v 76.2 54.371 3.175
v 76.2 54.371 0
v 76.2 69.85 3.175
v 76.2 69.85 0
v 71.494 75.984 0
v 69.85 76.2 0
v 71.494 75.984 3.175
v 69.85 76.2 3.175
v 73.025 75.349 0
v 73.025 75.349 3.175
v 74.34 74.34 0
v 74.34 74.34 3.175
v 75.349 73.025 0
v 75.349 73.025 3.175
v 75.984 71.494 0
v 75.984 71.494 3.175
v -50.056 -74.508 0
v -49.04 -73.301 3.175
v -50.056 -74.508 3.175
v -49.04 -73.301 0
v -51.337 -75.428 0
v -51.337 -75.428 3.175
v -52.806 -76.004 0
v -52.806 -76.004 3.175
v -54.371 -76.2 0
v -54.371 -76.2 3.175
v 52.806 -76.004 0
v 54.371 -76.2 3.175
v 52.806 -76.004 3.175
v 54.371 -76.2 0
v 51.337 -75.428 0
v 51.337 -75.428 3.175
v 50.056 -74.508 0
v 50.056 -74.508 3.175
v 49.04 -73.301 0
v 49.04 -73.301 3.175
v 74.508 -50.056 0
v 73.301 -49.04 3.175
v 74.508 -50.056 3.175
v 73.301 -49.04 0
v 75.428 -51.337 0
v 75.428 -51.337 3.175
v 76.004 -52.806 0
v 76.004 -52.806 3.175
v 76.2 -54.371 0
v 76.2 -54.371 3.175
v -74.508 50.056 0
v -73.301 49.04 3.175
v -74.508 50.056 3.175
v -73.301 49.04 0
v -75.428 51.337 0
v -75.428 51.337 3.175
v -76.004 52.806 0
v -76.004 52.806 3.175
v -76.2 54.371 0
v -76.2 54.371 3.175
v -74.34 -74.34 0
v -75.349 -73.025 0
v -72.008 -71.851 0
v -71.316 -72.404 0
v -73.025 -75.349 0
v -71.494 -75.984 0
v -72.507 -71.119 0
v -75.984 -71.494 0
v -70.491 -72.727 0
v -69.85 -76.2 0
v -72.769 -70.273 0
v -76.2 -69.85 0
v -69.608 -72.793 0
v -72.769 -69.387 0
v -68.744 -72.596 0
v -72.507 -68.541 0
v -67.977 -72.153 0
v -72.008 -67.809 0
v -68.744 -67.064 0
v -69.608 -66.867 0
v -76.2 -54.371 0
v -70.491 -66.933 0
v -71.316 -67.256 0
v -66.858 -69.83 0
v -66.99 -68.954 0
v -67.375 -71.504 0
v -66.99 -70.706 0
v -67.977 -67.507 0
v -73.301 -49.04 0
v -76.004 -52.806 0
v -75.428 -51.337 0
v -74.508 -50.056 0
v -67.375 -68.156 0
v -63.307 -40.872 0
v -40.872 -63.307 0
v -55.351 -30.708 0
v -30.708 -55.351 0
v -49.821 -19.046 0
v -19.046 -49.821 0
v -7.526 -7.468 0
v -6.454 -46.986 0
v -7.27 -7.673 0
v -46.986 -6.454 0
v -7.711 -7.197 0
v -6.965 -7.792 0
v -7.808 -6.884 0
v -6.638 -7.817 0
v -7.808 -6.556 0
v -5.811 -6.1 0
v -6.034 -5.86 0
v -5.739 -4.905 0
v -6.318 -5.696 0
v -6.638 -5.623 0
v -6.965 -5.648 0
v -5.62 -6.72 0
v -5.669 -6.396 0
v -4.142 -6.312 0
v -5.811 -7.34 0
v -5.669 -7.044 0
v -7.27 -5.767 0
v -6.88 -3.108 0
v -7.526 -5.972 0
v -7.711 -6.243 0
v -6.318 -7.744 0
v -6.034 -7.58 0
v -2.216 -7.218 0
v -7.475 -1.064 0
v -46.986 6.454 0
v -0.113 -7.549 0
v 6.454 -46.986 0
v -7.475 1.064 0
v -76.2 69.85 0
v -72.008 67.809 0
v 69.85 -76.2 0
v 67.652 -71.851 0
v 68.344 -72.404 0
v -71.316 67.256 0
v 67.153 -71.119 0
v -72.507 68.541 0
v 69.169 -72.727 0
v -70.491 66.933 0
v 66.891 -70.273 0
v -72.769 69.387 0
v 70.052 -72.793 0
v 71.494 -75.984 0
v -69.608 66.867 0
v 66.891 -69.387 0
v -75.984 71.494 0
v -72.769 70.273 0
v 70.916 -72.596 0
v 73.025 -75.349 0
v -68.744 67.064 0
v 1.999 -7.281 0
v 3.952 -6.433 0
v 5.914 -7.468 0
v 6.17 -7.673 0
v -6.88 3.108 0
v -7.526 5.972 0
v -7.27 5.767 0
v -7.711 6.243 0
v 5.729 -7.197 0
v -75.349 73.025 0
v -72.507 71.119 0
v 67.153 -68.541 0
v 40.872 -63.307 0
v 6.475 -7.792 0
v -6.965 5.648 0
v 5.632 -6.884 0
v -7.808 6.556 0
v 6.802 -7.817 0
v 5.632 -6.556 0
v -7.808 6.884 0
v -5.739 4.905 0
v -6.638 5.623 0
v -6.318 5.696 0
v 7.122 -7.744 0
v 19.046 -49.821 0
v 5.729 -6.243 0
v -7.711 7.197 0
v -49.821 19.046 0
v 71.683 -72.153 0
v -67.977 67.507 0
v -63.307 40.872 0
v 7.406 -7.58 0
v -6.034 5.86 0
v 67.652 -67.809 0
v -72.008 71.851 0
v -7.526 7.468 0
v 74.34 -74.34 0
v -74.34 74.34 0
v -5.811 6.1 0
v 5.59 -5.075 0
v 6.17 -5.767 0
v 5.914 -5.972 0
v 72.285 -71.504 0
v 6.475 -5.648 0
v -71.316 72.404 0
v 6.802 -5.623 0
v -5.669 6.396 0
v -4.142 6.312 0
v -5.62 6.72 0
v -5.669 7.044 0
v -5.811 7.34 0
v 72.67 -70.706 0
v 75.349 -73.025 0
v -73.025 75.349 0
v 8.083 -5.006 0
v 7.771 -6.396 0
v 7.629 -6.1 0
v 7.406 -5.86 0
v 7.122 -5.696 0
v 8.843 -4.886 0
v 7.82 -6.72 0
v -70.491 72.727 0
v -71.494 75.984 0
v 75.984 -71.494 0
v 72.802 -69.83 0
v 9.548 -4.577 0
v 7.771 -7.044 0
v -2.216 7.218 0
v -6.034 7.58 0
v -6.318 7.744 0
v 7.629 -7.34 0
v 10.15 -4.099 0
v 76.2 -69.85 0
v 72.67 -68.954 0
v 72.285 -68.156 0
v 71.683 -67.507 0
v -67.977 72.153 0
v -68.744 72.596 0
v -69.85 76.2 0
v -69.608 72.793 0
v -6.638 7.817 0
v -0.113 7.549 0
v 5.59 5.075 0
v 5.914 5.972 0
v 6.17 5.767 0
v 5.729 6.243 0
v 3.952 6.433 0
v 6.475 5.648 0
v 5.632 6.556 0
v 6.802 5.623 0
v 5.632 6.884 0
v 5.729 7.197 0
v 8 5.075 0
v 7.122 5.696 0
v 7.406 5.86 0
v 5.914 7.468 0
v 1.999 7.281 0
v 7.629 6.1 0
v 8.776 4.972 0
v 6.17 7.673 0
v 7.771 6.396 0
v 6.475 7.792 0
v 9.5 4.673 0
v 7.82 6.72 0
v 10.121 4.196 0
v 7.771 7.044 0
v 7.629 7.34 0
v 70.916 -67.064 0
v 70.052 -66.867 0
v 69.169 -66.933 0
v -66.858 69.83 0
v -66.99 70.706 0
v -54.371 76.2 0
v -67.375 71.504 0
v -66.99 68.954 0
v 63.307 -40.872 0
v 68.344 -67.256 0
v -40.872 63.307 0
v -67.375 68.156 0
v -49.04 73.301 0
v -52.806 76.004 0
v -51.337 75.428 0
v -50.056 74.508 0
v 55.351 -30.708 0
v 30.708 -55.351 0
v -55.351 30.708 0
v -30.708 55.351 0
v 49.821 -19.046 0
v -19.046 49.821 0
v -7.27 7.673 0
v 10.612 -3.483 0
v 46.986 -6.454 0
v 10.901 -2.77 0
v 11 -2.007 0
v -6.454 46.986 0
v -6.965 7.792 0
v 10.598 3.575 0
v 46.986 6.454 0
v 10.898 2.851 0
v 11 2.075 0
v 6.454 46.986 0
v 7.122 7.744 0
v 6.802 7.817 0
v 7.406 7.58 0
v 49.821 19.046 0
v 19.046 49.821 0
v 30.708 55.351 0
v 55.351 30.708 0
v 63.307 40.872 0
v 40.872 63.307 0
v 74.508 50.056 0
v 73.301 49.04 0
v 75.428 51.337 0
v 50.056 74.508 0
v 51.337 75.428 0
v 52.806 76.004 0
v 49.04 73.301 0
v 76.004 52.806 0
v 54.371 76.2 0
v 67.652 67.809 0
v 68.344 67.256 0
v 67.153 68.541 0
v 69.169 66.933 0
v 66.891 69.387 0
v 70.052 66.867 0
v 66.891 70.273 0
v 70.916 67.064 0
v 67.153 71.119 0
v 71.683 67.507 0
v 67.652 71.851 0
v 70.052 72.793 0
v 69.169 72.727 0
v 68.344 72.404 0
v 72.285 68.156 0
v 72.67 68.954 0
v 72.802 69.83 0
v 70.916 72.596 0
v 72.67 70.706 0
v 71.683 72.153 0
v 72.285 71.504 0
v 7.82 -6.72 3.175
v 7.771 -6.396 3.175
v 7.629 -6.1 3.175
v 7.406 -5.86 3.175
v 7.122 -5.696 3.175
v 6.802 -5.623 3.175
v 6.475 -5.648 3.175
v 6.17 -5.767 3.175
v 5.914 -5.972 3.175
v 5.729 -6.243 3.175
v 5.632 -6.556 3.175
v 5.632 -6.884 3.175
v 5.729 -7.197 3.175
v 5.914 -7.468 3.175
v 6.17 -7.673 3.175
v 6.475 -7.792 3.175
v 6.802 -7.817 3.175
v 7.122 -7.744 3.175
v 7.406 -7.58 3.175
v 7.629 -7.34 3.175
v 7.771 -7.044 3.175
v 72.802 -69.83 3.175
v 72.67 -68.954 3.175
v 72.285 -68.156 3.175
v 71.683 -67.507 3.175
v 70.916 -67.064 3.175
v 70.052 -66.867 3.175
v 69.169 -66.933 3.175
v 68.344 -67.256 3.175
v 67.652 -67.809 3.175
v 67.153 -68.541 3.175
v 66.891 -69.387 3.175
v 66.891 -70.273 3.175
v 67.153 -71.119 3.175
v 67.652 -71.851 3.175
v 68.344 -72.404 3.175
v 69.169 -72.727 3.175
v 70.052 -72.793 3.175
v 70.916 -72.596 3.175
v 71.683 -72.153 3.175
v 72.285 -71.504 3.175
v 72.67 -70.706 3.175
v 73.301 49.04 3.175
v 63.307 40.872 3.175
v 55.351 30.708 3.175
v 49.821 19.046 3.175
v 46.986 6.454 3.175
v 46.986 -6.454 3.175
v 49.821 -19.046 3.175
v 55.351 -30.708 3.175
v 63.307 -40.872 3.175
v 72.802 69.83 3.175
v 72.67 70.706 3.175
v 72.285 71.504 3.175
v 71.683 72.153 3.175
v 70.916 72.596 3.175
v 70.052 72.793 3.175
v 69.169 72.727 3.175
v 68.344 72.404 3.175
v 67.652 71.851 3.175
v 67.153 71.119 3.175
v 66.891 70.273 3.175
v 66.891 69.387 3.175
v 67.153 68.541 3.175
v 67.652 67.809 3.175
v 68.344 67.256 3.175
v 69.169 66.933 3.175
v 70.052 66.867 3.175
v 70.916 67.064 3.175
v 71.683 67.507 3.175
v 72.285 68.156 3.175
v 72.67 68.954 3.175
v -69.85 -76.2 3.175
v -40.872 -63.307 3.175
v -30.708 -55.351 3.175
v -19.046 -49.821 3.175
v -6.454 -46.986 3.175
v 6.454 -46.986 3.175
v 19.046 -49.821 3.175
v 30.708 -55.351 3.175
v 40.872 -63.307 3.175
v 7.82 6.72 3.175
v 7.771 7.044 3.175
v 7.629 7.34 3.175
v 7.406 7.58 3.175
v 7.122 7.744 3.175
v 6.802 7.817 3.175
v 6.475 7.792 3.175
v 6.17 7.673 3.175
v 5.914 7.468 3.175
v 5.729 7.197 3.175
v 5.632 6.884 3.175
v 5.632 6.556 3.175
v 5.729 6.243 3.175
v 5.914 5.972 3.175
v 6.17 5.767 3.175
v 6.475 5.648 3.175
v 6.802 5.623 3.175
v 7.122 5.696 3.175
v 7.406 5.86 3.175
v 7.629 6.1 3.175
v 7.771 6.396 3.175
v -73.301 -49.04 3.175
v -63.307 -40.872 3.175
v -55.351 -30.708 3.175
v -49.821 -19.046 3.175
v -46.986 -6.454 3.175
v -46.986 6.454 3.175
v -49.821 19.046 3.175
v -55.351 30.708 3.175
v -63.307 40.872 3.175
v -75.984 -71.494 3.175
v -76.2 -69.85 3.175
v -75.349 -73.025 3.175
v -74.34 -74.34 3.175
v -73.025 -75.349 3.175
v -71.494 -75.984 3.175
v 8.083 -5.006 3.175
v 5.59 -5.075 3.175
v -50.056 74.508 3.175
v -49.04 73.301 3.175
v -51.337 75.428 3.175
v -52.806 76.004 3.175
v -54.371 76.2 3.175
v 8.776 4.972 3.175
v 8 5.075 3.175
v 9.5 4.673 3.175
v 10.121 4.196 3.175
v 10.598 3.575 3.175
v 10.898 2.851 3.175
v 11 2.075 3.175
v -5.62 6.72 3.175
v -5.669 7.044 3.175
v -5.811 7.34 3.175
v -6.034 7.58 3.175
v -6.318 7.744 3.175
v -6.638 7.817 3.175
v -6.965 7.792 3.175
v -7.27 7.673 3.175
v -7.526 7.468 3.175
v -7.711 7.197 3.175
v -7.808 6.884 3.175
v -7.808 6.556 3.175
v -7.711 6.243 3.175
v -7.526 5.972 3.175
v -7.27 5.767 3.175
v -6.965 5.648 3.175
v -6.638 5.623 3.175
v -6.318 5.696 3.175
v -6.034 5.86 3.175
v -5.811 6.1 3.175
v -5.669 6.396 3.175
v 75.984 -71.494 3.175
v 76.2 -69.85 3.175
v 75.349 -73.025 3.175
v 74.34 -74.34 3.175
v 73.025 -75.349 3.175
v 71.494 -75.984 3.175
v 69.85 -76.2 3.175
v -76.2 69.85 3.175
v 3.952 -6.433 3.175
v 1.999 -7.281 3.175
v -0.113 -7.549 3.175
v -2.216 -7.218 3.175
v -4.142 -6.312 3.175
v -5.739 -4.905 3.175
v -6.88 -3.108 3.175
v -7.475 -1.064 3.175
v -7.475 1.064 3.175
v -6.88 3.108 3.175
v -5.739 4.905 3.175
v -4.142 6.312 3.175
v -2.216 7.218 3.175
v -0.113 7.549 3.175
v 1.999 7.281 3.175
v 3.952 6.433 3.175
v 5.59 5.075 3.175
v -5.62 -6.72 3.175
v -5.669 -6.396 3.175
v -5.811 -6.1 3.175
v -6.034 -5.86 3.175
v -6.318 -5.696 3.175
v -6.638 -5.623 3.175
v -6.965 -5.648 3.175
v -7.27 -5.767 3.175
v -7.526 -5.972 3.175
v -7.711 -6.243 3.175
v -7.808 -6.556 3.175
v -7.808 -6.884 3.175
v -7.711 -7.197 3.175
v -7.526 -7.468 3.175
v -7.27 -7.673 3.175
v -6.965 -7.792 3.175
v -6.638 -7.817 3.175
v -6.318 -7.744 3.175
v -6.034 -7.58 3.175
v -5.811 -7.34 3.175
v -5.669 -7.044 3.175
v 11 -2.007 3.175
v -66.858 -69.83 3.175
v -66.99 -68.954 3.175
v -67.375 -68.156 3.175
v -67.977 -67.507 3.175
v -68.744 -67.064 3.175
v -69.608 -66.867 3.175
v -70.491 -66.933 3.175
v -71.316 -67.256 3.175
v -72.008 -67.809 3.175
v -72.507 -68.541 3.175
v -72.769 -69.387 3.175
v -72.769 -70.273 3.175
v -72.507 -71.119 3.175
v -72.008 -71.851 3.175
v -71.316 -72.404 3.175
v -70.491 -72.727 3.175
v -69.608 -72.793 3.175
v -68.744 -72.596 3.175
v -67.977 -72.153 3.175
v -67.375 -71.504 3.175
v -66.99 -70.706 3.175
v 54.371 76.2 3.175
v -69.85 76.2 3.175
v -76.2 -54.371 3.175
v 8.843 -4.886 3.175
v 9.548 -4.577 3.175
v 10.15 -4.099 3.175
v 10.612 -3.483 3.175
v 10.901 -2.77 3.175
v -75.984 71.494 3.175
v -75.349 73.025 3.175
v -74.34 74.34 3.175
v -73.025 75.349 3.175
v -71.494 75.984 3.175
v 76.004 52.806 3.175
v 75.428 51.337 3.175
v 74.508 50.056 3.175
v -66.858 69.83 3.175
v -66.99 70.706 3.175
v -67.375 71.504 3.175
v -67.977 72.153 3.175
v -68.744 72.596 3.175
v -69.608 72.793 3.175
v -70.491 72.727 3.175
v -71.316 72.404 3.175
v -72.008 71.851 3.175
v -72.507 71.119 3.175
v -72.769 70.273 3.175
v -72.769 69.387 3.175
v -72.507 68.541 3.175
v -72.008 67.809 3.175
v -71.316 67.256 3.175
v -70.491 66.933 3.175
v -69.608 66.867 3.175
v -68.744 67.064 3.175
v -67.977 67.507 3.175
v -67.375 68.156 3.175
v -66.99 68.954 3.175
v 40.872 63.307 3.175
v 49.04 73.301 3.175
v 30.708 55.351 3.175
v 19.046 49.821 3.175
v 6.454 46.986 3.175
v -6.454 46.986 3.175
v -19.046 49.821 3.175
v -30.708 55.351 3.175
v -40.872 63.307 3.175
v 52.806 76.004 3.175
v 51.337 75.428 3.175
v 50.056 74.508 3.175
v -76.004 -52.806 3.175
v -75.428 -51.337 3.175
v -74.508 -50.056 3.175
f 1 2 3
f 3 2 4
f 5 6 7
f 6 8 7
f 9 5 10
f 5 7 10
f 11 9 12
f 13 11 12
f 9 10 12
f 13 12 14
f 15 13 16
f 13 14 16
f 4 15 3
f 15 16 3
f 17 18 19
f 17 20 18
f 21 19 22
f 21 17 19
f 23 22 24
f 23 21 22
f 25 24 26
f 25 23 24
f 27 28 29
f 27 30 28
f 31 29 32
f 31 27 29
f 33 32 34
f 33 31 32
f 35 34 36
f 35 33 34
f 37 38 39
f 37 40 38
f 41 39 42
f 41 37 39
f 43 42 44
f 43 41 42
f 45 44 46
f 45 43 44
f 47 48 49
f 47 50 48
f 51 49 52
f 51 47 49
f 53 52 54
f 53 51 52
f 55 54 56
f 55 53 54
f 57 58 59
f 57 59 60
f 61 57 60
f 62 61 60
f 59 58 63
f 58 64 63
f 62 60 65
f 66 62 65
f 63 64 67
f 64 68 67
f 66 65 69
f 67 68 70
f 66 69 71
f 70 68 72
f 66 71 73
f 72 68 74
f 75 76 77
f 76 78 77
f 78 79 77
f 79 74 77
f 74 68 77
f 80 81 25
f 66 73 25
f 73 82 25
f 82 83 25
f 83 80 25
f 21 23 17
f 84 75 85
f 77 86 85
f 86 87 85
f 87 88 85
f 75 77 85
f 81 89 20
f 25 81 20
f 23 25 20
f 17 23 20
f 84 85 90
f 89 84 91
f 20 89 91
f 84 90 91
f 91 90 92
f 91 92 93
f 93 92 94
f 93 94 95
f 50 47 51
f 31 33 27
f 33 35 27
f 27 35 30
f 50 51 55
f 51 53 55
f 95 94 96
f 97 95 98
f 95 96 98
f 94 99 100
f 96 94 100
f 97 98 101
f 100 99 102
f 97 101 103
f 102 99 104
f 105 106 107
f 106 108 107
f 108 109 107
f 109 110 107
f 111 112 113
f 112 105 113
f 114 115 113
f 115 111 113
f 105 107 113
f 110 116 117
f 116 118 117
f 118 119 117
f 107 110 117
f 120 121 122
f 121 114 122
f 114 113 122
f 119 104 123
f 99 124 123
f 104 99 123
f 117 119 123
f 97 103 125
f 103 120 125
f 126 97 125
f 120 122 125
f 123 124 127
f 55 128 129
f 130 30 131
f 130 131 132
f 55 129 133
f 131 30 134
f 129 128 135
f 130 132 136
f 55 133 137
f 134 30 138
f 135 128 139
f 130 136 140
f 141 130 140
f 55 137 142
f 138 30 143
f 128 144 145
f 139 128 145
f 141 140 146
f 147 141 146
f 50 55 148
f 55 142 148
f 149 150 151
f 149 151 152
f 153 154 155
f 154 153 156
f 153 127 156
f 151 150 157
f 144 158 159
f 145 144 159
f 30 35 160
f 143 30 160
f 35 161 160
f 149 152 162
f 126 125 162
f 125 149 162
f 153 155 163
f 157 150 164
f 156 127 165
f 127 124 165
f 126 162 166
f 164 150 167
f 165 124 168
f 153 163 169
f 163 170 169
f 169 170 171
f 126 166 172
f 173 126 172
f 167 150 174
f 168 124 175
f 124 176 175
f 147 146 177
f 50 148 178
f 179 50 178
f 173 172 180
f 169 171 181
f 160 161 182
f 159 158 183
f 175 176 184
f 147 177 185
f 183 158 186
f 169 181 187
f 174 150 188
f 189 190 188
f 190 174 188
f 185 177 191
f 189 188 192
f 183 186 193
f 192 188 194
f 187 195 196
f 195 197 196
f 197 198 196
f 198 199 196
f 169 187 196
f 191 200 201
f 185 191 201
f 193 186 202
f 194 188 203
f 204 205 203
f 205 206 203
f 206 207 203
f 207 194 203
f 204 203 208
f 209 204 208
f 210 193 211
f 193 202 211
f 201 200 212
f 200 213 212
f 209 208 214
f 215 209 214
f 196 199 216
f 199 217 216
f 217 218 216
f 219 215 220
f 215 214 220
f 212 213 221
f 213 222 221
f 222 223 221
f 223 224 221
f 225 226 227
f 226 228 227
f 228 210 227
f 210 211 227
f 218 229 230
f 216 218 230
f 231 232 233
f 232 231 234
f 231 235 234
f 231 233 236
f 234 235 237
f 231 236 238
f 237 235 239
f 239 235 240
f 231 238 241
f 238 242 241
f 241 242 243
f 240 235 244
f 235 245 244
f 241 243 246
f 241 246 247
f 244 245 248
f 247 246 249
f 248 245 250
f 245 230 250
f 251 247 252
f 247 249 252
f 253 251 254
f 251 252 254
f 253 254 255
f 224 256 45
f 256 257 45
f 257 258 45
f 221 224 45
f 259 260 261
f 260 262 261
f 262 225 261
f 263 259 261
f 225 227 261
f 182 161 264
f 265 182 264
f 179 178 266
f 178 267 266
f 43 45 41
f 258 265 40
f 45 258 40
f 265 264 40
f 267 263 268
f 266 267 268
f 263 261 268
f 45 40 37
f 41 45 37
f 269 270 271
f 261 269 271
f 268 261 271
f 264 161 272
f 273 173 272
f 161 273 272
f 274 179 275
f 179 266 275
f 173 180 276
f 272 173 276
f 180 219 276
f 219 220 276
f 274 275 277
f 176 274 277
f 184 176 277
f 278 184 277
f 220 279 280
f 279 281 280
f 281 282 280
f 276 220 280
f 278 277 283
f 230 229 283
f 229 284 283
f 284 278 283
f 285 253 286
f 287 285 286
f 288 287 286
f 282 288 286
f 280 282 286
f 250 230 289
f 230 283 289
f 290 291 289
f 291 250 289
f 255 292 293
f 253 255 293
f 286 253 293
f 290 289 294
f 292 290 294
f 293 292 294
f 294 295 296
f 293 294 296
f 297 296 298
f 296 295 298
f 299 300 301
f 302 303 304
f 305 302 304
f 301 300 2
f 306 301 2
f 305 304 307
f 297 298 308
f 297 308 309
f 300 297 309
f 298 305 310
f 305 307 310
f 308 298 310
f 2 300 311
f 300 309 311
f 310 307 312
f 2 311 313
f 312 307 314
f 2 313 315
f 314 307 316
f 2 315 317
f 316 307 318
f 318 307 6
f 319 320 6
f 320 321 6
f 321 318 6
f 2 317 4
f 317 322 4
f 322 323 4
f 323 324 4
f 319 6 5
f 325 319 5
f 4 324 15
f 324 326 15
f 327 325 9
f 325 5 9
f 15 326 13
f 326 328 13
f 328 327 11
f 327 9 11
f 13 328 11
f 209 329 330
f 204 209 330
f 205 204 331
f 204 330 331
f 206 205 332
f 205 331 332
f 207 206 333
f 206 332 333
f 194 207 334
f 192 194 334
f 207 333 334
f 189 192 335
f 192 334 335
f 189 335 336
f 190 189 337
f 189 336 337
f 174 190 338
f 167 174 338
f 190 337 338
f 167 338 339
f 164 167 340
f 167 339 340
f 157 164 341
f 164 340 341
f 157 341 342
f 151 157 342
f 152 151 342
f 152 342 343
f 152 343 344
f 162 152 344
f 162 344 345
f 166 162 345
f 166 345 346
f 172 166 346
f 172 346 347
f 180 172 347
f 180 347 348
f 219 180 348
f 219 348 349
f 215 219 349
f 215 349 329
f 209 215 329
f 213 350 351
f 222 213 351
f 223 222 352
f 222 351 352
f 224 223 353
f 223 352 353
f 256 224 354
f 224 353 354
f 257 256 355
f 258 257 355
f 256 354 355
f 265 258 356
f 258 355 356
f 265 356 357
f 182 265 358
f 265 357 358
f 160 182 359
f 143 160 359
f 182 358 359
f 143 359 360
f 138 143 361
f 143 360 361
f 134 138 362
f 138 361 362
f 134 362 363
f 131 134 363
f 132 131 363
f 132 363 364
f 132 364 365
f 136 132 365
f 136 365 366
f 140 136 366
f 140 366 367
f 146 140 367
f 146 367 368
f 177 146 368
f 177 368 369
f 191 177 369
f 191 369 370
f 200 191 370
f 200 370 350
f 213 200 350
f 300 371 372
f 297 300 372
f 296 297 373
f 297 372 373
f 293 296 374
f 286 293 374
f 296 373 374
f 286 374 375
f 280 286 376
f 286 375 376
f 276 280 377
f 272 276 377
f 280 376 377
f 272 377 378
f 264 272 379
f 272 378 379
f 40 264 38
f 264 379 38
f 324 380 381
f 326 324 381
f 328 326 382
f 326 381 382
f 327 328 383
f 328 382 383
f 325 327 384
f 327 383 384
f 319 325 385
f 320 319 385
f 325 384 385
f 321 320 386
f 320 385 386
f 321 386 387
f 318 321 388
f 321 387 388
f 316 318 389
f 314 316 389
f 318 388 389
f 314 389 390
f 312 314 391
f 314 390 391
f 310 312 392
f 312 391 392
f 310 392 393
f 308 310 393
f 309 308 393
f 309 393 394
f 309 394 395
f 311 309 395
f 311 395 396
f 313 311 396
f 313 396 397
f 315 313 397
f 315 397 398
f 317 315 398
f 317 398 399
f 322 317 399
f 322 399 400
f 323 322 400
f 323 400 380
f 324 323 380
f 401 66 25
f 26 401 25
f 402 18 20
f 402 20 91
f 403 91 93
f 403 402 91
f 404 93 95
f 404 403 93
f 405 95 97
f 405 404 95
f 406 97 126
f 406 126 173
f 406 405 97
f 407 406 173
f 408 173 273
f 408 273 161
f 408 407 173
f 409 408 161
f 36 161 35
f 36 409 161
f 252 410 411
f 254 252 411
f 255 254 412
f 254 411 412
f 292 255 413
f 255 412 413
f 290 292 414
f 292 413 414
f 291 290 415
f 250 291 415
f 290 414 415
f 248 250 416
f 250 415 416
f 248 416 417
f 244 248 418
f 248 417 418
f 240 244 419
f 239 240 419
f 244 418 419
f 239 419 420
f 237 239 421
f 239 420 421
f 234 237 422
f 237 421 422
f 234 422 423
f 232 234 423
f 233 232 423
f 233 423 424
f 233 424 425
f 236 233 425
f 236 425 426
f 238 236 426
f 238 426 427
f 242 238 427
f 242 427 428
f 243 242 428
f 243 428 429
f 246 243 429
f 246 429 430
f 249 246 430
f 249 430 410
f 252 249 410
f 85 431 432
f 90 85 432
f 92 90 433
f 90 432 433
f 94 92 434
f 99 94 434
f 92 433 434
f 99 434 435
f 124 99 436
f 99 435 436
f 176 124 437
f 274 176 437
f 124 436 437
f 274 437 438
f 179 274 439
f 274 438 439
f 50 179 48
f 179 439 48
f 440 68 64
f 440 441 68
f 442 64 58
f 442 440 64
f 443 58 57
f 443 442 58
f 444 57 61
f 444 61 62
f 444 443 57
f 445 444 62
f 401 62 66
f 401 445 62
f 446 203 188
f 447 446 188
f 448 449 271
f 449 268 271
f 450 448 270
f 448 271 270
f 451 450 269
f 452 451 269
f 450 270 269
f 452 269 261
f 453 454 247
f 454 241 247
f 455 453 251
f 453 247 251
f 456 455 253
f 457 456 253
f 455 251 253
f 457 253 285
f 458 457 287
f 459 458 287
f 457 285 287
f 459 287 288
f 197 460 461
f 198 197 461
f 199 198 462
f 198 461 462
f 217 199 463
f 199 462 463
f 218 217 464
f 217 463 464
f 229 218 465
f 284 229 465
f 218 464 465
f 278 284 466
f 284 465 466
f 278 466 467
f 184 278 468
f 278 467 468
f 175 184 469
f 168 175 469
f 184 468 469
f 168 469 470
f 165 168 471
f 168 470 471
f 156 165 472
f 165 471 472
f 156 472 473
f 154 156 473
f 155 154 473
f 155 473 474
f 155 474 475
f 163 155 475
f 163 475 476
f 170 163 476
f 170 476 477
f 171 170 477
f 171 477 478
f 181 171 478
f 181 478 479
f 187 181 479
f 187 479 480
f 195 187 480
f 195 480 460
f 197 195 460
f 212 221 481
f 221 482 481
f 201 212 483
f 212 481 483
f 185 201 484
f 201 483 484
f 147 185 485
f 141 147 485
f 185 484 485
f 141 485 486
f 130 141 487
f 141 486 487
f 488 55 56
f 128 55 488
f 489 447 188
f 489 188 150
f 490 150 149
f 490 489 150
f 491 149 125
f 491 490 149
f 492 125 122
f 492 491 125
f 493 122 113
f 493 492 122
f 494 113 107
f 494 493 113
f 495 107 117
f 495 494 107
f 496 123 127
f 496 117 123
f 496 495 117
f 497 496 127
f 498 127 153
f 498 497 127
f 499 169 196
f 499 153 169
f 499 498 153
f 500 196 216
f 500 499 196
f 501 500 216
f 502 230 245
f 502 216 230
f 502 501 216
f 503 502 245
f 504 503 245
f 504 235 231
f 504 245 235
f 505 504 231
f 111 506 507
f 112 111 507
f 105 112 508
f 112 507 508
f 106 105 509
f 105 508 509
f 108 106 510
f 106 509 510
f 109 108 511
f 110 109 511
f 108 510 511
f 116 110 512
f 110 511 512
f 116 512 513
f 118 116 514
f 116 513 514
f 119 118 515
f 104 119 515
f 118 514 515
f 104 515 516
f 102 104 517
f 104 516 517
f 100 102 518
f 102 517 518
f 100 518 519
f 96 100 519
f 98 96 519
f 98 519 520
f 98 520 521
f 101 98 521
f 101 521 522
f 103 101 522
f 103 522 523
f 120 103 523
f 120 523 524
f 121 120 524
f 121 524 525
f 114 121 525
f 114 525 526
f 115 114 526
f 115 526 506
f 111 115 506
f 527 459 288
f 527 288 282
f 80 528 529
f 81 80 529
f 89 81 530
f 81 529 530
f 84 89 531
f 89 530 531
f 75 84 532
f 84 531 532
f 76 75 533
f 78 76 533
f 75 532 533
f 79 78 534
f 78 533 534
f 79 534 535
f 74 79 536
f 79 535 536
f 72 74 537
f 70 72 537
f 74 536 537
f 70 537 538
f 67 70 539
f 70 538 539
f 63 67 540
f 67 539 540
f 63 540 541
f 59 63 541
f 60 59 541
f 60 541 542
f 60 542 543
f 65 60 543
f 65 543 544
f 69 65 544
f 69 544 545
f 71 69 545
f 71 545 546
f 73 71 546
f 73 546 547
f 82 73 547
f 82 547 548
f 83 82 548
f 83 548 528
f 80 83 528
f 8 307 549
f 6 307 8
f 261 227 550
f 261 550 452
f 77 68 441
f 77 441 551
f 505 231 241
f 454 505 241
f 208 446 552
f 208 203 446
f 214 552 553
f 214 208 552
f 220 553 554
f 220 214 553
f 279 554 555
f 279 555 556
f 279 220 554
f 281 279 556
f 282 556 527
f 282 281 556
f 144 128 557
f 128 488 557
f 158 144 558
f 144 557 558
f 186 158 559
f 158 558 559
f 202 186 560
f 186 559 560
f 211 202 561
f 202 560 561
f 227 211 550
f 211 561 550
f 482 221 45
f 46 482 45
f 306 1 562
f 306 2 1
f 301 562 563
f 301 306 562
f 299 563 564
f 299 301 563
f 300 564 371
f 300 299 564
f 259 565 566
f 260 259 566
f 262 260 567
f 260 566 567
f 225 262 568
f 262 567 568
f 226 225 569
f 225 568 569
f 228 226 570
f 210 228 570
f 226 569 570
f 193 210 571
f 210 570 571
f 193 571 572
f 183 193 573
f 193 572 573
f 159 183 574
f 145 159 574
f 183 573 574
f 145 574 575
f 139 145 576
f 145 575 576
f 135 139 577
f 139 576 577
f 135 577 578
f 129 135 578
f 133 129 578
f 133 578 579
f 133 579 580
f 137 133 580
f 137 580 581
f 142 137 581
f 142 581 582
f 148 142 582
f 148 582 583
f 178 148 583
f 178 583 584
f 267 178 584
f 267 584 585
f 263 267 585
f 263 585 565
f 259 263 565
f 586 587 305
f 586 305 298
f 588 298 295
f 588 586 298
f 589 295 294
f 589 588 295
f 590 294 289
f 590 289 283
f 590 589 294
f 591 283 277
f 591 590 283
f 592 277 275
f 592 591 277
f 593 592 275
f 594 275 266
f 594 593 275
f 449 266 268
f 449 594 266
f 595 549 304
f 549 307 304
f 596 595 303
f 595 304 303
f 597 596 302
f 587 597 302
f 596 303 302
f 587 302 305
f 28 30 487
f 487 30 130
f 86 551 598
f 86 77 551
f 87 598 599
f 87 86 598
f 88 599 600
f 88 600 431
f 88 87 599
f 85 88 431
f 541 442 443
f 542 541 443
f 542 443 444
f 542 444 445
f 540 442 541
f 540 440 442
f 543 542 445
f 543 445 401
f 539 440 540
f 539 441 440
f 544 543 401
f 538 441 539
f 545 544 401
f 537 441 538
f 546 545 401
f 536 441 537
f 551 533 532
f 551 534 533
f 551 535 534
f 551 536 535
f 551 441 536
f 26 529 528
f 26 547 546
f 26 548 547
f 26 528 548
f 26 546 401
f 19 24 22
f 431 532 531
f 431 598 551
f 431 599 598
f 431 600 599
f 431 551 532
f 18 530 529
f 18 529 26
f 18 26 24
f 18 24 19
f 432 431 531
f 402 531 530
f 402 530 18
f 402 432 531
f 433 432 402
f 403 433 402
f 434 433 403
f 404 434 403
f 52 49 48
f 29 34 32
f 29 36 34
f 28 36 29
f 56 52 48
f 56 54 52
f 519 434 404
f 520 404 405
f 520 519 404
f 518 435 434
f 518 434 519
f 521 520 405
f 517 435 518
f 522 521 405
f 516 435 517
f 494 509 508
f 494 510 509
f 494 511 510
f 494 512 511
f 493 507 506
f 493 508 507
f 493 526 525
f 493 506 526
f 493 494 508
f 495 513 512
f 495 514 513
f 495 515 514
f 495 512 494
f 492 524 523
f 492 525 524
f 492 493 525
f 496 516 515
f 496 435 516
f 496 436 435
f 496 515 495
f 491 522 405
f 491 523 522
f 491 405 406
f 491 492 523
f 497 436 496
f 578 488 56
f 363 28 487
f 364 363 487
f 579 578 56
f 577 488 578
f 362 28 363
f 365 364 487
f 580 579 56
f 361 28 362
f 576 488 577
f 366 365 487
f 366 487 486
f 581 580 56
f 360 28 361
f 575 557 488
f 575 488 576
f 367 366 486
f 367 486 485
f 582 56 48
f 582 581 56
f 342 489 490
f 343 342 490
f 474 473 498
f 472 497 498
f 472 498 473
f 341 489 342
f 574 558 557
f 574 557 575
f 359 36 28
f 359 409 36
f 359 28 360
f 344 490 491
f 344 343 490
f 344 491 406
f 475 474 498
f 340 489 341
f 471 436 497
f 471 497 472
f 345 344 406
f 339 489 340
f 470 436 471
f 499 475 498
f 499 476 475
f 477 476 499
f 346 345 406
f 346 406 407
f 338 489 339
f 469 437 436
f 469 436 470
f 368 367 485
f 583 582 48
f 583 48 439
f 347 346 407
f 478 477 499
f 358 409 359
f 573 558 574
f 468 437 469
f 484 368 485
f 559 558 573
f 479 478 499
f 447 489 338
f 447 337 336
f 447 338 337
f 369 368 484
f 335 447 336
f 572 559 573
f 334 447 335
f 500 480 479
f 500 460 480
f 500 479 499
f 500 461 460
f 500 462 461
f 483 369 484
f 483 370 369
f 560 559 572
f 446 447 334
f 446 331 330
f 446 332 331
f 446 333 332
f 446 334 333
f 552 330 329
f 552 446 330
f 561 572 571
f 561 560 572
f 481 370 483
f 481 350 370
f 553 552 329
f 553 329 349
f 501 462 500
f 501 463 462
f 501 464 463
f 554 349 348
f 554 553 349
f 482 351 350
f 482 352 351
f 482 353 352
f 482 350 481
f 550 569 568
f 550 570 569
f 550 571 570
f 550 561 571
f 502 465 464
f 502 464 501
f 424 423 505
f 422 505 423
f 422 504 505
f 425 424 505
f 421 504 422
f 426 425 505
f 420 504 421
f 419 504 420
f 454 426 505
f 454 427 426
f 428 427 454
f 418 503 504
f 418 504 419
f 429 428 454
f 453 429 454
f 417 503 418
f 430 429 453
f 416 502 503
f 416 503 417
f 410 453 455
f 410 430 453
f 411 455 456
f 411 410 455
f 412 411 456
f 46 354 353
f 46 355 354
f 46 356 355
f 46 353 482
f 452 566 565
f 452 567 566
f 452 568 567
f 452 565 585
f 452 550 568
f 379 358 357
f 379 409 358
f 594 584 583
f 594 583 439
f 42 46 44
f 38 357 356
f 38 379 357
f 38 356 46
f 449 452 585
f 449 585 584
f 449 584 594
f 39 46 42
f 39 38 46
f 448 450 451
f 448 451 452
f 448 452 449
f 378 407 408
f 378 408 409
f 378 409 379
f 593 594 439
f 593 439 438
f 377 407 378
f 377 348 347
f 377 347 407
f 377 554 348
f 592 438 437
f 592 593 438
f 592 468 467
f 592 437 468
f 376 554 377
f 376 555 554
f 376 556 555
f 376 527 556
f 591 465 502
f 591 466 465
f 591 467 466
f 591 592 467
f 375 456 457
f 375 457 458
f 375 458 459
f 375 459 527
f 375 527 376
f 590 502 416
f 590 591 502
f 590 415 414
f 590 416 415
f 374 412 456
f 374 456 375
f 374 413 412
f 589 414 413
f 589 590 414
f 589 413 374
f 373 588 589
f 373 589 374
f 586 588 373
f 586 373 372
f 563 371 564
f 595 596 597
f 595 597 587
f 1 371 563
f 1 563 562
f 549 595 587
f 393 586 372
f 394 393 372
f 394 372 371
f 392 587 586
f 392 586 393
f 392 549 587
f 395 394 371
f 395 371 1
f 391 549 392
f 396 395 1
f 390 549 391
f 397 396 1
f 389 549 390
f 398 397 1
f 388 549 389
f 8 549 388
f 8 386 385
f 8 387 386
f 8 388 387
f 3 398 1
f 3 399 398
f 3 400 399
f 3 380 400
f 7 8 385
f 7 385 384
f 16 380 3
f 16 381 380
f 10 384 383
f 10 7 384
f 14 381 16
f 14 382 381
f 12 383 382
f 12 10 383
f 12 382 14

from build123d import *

# Parameters (mm, degrees)
SKETCH3_W               = 152.4
SKETCH3_H               = 152.4
BOSS_EXTRUDE3_DEPTH     = 3.175
MOTOR_CUT_OUT_DEPTH     = 4.175
SKETCH20_R              = 2.9718
BOLT_HOLES_DEPTH        = 1
BOLT_HOLES_DEPTH_BACK   = 4.175
EDGE_CUT_OUT_DEPTH      = 3.175
FILLET2_R               = 6.35
MIRROR5_COPY_1_DEPTH    = 3.175
FILLET3_R               = 6.35
FILLET4_R               = 6.35
FILLET12_R              = 3
SKETCH27_R              = 1.1
MOTOR_SCREWS_HOLE_DEPTH = 4.175


with BuildPart() as part:
    # Sketch3 → Boss-Extrude3 (new body)
    with BuildSketch(Plane.XY):
        Rectangle(SKETCH3_W, SKETCH3_H)
    extrude(amount=BOSS_EXTRUDE3_DEPTH)

    # Sketch13 → Motor Cut Out (cut, through all)
    with BuildSketch(Plane(origin=(0.106889783, -2.03090588, 3.175), x_dir=(1, 0, 0), z_dir=(0, 0, 1))):
        with BuildLine():
            Line((5.483280161, 7.105597989), (10.893110217, 7.105597989))
            Line((10.893110217, 7.105597989), (10.893110217, -2.894402011))
            Line((10.893110217, -2.894402011), (5.483280161, -3.043786229))
            ThreePointArc((5.483280161, -3.043786229), (-7.656889783, 2.03090588), (5.483280161, 7.105597989))
        make_face()
    extrude(amount=-MOTOR_CUT_OUT_DEPTH, mode=Mode.SUBTRACT)

    # Sketch20 → Bolt Holes (cut, two sides)
    with BuildSketch(Plane.XY.offset(3.175)) as bolt_holes_sk:
        with Locations((-69.83, 69.83)):
            Circle(SKETCH20_R)
        with Locations((69.83, 69.83)):
            Circle(SKETCH20_R)
        with Locations((69.83, -69.83)):
            Circle(SKETCH20_R)
        with Locations((-69.83, -69.83)):
            Circle(SKETCH20_R)
    extrude(amount=BOLT_HOLES_DEPTH, mode=Mode.SUBTRACT)
    extrude(bolt_holes_sk.sketch, amount=-BOLT_HOLES_DEPTH_BACK, mode=Mode.SUBTRACT)

    # Sketch25 → Edge cut out (cut)
    with BuildSketch(Plane.XY.offset(3.175)):
        with BuildLine():
            Line((-76.2, 50.8), (-76.2, -50.8))
            ThreePointArc((-76.2, -50.8), (-46.628854397, 0), (-76.2, 50.8))
        make_face()
    edge_cut_out = extrude(amount=-EDGE_CUT_OUT_DEPTH, mode=Mode.SUBTRACT)

    # Fillet2
    fillet2_edges = [part.edges().sort_by_distance(p)[0] for p in [
        (-76.2, -50.8, 1.5875),
        (-76.2, 50.8, 1.5875),
        (-76.2, -76.2, 1.5875),
        (-76.2, 76.2, 1.5875),
    ]]
    fillet(fillet2_edges, radius=FILLET2_R)

    # Mirror4: Edge cut out across plane
    add(edge_cut_out.mirror(Plane(origin=(0, 0, 0), x_dir=(0, 0, 1), z_dir=(0.707106781, -0.707106781, 0))), mode=Mode.SUBTRACT)

    # Mirror5: Edge cut out across plane
    add(edge_cut_out.mirror(Plane(origin=(0, 0, 0), x_dir=(0, 0, 1), z_dir=(-0.707106781, -0.707106781, 0))), mode=Mode.SUBTRACT)

    # Mirror5 copy 1 sketch → Mirror5 copy 1 (cut)
    with BuildSketch(Plane(origin=(0, 0, 3.175), x_dir=(-1, 0, 0), z_dir=(0, 0, 1))):
        with BuildLine():
            Line((-76.2, 50.8), (-76.2, -50.8))
            ThreePointArc((-76.2, -50.8), (-46.628854397, 0), (-76.2, 50.8))
        make_face()
    extrude(amount=-MIRROR5_COPY_1_DEPTH, mode=Mode.SUBTRACT)

    # Fillet3
    fillet3_edges = [part.edges().sort_by_distance(p)[0] for p in [
        (76.2, -76.2, 1.5875),
        (76.2, 76.2, 1.5875),
        (-50.8, -76.2, 1.5875),
        (50.8, -76.2, 1.5875),
        (76.2, 50.8, 1.5875),
        (76.2, -50.8, 1.5875),
    ]]
    fillet(fillet3_edges, radius=FILLET3_R)

    # Fillet4
    fillet4_edges = [part.edges().sort_by_distance(p)[0] for p in [
        (50.8, 76.2, 1.5875),
        (-50.8, 76.2, 1.5875),
    ]]
    fillet(fillet4_edges, radius=FILLET4_R)

    # Fillet12
    fillet12_edges = [part.edges().sort_by_distance(p)[0] for p in [
        (11, 5.074692109, 1.5875),
        (11, -4.925307891, 1.5875),
    ]]
    fillet(fillet12_edges, radius=FILLET12_R)

    # Sketch27 → Motor screws hole (cut, through all)
    with BuildSketch(Plane.XY.offset(3.175)):
        with Locations((6.72, -6.72)):
            Circle(SKETCH27_R)
        with Locations((6.72, 6.72)):
            Circle(SKETCH27_R)
        with Locations((-6.72, 6.72)):
            Circle(SKETCH27_R)
        with Locations((-6.72, -6.72)):
            Circle(SKETCH27_R)
    extrude(amount=-MOTOR_SCREWS_HOLE_DEPTH, mode=Mode.SUBTRACT)


solid = part.part
